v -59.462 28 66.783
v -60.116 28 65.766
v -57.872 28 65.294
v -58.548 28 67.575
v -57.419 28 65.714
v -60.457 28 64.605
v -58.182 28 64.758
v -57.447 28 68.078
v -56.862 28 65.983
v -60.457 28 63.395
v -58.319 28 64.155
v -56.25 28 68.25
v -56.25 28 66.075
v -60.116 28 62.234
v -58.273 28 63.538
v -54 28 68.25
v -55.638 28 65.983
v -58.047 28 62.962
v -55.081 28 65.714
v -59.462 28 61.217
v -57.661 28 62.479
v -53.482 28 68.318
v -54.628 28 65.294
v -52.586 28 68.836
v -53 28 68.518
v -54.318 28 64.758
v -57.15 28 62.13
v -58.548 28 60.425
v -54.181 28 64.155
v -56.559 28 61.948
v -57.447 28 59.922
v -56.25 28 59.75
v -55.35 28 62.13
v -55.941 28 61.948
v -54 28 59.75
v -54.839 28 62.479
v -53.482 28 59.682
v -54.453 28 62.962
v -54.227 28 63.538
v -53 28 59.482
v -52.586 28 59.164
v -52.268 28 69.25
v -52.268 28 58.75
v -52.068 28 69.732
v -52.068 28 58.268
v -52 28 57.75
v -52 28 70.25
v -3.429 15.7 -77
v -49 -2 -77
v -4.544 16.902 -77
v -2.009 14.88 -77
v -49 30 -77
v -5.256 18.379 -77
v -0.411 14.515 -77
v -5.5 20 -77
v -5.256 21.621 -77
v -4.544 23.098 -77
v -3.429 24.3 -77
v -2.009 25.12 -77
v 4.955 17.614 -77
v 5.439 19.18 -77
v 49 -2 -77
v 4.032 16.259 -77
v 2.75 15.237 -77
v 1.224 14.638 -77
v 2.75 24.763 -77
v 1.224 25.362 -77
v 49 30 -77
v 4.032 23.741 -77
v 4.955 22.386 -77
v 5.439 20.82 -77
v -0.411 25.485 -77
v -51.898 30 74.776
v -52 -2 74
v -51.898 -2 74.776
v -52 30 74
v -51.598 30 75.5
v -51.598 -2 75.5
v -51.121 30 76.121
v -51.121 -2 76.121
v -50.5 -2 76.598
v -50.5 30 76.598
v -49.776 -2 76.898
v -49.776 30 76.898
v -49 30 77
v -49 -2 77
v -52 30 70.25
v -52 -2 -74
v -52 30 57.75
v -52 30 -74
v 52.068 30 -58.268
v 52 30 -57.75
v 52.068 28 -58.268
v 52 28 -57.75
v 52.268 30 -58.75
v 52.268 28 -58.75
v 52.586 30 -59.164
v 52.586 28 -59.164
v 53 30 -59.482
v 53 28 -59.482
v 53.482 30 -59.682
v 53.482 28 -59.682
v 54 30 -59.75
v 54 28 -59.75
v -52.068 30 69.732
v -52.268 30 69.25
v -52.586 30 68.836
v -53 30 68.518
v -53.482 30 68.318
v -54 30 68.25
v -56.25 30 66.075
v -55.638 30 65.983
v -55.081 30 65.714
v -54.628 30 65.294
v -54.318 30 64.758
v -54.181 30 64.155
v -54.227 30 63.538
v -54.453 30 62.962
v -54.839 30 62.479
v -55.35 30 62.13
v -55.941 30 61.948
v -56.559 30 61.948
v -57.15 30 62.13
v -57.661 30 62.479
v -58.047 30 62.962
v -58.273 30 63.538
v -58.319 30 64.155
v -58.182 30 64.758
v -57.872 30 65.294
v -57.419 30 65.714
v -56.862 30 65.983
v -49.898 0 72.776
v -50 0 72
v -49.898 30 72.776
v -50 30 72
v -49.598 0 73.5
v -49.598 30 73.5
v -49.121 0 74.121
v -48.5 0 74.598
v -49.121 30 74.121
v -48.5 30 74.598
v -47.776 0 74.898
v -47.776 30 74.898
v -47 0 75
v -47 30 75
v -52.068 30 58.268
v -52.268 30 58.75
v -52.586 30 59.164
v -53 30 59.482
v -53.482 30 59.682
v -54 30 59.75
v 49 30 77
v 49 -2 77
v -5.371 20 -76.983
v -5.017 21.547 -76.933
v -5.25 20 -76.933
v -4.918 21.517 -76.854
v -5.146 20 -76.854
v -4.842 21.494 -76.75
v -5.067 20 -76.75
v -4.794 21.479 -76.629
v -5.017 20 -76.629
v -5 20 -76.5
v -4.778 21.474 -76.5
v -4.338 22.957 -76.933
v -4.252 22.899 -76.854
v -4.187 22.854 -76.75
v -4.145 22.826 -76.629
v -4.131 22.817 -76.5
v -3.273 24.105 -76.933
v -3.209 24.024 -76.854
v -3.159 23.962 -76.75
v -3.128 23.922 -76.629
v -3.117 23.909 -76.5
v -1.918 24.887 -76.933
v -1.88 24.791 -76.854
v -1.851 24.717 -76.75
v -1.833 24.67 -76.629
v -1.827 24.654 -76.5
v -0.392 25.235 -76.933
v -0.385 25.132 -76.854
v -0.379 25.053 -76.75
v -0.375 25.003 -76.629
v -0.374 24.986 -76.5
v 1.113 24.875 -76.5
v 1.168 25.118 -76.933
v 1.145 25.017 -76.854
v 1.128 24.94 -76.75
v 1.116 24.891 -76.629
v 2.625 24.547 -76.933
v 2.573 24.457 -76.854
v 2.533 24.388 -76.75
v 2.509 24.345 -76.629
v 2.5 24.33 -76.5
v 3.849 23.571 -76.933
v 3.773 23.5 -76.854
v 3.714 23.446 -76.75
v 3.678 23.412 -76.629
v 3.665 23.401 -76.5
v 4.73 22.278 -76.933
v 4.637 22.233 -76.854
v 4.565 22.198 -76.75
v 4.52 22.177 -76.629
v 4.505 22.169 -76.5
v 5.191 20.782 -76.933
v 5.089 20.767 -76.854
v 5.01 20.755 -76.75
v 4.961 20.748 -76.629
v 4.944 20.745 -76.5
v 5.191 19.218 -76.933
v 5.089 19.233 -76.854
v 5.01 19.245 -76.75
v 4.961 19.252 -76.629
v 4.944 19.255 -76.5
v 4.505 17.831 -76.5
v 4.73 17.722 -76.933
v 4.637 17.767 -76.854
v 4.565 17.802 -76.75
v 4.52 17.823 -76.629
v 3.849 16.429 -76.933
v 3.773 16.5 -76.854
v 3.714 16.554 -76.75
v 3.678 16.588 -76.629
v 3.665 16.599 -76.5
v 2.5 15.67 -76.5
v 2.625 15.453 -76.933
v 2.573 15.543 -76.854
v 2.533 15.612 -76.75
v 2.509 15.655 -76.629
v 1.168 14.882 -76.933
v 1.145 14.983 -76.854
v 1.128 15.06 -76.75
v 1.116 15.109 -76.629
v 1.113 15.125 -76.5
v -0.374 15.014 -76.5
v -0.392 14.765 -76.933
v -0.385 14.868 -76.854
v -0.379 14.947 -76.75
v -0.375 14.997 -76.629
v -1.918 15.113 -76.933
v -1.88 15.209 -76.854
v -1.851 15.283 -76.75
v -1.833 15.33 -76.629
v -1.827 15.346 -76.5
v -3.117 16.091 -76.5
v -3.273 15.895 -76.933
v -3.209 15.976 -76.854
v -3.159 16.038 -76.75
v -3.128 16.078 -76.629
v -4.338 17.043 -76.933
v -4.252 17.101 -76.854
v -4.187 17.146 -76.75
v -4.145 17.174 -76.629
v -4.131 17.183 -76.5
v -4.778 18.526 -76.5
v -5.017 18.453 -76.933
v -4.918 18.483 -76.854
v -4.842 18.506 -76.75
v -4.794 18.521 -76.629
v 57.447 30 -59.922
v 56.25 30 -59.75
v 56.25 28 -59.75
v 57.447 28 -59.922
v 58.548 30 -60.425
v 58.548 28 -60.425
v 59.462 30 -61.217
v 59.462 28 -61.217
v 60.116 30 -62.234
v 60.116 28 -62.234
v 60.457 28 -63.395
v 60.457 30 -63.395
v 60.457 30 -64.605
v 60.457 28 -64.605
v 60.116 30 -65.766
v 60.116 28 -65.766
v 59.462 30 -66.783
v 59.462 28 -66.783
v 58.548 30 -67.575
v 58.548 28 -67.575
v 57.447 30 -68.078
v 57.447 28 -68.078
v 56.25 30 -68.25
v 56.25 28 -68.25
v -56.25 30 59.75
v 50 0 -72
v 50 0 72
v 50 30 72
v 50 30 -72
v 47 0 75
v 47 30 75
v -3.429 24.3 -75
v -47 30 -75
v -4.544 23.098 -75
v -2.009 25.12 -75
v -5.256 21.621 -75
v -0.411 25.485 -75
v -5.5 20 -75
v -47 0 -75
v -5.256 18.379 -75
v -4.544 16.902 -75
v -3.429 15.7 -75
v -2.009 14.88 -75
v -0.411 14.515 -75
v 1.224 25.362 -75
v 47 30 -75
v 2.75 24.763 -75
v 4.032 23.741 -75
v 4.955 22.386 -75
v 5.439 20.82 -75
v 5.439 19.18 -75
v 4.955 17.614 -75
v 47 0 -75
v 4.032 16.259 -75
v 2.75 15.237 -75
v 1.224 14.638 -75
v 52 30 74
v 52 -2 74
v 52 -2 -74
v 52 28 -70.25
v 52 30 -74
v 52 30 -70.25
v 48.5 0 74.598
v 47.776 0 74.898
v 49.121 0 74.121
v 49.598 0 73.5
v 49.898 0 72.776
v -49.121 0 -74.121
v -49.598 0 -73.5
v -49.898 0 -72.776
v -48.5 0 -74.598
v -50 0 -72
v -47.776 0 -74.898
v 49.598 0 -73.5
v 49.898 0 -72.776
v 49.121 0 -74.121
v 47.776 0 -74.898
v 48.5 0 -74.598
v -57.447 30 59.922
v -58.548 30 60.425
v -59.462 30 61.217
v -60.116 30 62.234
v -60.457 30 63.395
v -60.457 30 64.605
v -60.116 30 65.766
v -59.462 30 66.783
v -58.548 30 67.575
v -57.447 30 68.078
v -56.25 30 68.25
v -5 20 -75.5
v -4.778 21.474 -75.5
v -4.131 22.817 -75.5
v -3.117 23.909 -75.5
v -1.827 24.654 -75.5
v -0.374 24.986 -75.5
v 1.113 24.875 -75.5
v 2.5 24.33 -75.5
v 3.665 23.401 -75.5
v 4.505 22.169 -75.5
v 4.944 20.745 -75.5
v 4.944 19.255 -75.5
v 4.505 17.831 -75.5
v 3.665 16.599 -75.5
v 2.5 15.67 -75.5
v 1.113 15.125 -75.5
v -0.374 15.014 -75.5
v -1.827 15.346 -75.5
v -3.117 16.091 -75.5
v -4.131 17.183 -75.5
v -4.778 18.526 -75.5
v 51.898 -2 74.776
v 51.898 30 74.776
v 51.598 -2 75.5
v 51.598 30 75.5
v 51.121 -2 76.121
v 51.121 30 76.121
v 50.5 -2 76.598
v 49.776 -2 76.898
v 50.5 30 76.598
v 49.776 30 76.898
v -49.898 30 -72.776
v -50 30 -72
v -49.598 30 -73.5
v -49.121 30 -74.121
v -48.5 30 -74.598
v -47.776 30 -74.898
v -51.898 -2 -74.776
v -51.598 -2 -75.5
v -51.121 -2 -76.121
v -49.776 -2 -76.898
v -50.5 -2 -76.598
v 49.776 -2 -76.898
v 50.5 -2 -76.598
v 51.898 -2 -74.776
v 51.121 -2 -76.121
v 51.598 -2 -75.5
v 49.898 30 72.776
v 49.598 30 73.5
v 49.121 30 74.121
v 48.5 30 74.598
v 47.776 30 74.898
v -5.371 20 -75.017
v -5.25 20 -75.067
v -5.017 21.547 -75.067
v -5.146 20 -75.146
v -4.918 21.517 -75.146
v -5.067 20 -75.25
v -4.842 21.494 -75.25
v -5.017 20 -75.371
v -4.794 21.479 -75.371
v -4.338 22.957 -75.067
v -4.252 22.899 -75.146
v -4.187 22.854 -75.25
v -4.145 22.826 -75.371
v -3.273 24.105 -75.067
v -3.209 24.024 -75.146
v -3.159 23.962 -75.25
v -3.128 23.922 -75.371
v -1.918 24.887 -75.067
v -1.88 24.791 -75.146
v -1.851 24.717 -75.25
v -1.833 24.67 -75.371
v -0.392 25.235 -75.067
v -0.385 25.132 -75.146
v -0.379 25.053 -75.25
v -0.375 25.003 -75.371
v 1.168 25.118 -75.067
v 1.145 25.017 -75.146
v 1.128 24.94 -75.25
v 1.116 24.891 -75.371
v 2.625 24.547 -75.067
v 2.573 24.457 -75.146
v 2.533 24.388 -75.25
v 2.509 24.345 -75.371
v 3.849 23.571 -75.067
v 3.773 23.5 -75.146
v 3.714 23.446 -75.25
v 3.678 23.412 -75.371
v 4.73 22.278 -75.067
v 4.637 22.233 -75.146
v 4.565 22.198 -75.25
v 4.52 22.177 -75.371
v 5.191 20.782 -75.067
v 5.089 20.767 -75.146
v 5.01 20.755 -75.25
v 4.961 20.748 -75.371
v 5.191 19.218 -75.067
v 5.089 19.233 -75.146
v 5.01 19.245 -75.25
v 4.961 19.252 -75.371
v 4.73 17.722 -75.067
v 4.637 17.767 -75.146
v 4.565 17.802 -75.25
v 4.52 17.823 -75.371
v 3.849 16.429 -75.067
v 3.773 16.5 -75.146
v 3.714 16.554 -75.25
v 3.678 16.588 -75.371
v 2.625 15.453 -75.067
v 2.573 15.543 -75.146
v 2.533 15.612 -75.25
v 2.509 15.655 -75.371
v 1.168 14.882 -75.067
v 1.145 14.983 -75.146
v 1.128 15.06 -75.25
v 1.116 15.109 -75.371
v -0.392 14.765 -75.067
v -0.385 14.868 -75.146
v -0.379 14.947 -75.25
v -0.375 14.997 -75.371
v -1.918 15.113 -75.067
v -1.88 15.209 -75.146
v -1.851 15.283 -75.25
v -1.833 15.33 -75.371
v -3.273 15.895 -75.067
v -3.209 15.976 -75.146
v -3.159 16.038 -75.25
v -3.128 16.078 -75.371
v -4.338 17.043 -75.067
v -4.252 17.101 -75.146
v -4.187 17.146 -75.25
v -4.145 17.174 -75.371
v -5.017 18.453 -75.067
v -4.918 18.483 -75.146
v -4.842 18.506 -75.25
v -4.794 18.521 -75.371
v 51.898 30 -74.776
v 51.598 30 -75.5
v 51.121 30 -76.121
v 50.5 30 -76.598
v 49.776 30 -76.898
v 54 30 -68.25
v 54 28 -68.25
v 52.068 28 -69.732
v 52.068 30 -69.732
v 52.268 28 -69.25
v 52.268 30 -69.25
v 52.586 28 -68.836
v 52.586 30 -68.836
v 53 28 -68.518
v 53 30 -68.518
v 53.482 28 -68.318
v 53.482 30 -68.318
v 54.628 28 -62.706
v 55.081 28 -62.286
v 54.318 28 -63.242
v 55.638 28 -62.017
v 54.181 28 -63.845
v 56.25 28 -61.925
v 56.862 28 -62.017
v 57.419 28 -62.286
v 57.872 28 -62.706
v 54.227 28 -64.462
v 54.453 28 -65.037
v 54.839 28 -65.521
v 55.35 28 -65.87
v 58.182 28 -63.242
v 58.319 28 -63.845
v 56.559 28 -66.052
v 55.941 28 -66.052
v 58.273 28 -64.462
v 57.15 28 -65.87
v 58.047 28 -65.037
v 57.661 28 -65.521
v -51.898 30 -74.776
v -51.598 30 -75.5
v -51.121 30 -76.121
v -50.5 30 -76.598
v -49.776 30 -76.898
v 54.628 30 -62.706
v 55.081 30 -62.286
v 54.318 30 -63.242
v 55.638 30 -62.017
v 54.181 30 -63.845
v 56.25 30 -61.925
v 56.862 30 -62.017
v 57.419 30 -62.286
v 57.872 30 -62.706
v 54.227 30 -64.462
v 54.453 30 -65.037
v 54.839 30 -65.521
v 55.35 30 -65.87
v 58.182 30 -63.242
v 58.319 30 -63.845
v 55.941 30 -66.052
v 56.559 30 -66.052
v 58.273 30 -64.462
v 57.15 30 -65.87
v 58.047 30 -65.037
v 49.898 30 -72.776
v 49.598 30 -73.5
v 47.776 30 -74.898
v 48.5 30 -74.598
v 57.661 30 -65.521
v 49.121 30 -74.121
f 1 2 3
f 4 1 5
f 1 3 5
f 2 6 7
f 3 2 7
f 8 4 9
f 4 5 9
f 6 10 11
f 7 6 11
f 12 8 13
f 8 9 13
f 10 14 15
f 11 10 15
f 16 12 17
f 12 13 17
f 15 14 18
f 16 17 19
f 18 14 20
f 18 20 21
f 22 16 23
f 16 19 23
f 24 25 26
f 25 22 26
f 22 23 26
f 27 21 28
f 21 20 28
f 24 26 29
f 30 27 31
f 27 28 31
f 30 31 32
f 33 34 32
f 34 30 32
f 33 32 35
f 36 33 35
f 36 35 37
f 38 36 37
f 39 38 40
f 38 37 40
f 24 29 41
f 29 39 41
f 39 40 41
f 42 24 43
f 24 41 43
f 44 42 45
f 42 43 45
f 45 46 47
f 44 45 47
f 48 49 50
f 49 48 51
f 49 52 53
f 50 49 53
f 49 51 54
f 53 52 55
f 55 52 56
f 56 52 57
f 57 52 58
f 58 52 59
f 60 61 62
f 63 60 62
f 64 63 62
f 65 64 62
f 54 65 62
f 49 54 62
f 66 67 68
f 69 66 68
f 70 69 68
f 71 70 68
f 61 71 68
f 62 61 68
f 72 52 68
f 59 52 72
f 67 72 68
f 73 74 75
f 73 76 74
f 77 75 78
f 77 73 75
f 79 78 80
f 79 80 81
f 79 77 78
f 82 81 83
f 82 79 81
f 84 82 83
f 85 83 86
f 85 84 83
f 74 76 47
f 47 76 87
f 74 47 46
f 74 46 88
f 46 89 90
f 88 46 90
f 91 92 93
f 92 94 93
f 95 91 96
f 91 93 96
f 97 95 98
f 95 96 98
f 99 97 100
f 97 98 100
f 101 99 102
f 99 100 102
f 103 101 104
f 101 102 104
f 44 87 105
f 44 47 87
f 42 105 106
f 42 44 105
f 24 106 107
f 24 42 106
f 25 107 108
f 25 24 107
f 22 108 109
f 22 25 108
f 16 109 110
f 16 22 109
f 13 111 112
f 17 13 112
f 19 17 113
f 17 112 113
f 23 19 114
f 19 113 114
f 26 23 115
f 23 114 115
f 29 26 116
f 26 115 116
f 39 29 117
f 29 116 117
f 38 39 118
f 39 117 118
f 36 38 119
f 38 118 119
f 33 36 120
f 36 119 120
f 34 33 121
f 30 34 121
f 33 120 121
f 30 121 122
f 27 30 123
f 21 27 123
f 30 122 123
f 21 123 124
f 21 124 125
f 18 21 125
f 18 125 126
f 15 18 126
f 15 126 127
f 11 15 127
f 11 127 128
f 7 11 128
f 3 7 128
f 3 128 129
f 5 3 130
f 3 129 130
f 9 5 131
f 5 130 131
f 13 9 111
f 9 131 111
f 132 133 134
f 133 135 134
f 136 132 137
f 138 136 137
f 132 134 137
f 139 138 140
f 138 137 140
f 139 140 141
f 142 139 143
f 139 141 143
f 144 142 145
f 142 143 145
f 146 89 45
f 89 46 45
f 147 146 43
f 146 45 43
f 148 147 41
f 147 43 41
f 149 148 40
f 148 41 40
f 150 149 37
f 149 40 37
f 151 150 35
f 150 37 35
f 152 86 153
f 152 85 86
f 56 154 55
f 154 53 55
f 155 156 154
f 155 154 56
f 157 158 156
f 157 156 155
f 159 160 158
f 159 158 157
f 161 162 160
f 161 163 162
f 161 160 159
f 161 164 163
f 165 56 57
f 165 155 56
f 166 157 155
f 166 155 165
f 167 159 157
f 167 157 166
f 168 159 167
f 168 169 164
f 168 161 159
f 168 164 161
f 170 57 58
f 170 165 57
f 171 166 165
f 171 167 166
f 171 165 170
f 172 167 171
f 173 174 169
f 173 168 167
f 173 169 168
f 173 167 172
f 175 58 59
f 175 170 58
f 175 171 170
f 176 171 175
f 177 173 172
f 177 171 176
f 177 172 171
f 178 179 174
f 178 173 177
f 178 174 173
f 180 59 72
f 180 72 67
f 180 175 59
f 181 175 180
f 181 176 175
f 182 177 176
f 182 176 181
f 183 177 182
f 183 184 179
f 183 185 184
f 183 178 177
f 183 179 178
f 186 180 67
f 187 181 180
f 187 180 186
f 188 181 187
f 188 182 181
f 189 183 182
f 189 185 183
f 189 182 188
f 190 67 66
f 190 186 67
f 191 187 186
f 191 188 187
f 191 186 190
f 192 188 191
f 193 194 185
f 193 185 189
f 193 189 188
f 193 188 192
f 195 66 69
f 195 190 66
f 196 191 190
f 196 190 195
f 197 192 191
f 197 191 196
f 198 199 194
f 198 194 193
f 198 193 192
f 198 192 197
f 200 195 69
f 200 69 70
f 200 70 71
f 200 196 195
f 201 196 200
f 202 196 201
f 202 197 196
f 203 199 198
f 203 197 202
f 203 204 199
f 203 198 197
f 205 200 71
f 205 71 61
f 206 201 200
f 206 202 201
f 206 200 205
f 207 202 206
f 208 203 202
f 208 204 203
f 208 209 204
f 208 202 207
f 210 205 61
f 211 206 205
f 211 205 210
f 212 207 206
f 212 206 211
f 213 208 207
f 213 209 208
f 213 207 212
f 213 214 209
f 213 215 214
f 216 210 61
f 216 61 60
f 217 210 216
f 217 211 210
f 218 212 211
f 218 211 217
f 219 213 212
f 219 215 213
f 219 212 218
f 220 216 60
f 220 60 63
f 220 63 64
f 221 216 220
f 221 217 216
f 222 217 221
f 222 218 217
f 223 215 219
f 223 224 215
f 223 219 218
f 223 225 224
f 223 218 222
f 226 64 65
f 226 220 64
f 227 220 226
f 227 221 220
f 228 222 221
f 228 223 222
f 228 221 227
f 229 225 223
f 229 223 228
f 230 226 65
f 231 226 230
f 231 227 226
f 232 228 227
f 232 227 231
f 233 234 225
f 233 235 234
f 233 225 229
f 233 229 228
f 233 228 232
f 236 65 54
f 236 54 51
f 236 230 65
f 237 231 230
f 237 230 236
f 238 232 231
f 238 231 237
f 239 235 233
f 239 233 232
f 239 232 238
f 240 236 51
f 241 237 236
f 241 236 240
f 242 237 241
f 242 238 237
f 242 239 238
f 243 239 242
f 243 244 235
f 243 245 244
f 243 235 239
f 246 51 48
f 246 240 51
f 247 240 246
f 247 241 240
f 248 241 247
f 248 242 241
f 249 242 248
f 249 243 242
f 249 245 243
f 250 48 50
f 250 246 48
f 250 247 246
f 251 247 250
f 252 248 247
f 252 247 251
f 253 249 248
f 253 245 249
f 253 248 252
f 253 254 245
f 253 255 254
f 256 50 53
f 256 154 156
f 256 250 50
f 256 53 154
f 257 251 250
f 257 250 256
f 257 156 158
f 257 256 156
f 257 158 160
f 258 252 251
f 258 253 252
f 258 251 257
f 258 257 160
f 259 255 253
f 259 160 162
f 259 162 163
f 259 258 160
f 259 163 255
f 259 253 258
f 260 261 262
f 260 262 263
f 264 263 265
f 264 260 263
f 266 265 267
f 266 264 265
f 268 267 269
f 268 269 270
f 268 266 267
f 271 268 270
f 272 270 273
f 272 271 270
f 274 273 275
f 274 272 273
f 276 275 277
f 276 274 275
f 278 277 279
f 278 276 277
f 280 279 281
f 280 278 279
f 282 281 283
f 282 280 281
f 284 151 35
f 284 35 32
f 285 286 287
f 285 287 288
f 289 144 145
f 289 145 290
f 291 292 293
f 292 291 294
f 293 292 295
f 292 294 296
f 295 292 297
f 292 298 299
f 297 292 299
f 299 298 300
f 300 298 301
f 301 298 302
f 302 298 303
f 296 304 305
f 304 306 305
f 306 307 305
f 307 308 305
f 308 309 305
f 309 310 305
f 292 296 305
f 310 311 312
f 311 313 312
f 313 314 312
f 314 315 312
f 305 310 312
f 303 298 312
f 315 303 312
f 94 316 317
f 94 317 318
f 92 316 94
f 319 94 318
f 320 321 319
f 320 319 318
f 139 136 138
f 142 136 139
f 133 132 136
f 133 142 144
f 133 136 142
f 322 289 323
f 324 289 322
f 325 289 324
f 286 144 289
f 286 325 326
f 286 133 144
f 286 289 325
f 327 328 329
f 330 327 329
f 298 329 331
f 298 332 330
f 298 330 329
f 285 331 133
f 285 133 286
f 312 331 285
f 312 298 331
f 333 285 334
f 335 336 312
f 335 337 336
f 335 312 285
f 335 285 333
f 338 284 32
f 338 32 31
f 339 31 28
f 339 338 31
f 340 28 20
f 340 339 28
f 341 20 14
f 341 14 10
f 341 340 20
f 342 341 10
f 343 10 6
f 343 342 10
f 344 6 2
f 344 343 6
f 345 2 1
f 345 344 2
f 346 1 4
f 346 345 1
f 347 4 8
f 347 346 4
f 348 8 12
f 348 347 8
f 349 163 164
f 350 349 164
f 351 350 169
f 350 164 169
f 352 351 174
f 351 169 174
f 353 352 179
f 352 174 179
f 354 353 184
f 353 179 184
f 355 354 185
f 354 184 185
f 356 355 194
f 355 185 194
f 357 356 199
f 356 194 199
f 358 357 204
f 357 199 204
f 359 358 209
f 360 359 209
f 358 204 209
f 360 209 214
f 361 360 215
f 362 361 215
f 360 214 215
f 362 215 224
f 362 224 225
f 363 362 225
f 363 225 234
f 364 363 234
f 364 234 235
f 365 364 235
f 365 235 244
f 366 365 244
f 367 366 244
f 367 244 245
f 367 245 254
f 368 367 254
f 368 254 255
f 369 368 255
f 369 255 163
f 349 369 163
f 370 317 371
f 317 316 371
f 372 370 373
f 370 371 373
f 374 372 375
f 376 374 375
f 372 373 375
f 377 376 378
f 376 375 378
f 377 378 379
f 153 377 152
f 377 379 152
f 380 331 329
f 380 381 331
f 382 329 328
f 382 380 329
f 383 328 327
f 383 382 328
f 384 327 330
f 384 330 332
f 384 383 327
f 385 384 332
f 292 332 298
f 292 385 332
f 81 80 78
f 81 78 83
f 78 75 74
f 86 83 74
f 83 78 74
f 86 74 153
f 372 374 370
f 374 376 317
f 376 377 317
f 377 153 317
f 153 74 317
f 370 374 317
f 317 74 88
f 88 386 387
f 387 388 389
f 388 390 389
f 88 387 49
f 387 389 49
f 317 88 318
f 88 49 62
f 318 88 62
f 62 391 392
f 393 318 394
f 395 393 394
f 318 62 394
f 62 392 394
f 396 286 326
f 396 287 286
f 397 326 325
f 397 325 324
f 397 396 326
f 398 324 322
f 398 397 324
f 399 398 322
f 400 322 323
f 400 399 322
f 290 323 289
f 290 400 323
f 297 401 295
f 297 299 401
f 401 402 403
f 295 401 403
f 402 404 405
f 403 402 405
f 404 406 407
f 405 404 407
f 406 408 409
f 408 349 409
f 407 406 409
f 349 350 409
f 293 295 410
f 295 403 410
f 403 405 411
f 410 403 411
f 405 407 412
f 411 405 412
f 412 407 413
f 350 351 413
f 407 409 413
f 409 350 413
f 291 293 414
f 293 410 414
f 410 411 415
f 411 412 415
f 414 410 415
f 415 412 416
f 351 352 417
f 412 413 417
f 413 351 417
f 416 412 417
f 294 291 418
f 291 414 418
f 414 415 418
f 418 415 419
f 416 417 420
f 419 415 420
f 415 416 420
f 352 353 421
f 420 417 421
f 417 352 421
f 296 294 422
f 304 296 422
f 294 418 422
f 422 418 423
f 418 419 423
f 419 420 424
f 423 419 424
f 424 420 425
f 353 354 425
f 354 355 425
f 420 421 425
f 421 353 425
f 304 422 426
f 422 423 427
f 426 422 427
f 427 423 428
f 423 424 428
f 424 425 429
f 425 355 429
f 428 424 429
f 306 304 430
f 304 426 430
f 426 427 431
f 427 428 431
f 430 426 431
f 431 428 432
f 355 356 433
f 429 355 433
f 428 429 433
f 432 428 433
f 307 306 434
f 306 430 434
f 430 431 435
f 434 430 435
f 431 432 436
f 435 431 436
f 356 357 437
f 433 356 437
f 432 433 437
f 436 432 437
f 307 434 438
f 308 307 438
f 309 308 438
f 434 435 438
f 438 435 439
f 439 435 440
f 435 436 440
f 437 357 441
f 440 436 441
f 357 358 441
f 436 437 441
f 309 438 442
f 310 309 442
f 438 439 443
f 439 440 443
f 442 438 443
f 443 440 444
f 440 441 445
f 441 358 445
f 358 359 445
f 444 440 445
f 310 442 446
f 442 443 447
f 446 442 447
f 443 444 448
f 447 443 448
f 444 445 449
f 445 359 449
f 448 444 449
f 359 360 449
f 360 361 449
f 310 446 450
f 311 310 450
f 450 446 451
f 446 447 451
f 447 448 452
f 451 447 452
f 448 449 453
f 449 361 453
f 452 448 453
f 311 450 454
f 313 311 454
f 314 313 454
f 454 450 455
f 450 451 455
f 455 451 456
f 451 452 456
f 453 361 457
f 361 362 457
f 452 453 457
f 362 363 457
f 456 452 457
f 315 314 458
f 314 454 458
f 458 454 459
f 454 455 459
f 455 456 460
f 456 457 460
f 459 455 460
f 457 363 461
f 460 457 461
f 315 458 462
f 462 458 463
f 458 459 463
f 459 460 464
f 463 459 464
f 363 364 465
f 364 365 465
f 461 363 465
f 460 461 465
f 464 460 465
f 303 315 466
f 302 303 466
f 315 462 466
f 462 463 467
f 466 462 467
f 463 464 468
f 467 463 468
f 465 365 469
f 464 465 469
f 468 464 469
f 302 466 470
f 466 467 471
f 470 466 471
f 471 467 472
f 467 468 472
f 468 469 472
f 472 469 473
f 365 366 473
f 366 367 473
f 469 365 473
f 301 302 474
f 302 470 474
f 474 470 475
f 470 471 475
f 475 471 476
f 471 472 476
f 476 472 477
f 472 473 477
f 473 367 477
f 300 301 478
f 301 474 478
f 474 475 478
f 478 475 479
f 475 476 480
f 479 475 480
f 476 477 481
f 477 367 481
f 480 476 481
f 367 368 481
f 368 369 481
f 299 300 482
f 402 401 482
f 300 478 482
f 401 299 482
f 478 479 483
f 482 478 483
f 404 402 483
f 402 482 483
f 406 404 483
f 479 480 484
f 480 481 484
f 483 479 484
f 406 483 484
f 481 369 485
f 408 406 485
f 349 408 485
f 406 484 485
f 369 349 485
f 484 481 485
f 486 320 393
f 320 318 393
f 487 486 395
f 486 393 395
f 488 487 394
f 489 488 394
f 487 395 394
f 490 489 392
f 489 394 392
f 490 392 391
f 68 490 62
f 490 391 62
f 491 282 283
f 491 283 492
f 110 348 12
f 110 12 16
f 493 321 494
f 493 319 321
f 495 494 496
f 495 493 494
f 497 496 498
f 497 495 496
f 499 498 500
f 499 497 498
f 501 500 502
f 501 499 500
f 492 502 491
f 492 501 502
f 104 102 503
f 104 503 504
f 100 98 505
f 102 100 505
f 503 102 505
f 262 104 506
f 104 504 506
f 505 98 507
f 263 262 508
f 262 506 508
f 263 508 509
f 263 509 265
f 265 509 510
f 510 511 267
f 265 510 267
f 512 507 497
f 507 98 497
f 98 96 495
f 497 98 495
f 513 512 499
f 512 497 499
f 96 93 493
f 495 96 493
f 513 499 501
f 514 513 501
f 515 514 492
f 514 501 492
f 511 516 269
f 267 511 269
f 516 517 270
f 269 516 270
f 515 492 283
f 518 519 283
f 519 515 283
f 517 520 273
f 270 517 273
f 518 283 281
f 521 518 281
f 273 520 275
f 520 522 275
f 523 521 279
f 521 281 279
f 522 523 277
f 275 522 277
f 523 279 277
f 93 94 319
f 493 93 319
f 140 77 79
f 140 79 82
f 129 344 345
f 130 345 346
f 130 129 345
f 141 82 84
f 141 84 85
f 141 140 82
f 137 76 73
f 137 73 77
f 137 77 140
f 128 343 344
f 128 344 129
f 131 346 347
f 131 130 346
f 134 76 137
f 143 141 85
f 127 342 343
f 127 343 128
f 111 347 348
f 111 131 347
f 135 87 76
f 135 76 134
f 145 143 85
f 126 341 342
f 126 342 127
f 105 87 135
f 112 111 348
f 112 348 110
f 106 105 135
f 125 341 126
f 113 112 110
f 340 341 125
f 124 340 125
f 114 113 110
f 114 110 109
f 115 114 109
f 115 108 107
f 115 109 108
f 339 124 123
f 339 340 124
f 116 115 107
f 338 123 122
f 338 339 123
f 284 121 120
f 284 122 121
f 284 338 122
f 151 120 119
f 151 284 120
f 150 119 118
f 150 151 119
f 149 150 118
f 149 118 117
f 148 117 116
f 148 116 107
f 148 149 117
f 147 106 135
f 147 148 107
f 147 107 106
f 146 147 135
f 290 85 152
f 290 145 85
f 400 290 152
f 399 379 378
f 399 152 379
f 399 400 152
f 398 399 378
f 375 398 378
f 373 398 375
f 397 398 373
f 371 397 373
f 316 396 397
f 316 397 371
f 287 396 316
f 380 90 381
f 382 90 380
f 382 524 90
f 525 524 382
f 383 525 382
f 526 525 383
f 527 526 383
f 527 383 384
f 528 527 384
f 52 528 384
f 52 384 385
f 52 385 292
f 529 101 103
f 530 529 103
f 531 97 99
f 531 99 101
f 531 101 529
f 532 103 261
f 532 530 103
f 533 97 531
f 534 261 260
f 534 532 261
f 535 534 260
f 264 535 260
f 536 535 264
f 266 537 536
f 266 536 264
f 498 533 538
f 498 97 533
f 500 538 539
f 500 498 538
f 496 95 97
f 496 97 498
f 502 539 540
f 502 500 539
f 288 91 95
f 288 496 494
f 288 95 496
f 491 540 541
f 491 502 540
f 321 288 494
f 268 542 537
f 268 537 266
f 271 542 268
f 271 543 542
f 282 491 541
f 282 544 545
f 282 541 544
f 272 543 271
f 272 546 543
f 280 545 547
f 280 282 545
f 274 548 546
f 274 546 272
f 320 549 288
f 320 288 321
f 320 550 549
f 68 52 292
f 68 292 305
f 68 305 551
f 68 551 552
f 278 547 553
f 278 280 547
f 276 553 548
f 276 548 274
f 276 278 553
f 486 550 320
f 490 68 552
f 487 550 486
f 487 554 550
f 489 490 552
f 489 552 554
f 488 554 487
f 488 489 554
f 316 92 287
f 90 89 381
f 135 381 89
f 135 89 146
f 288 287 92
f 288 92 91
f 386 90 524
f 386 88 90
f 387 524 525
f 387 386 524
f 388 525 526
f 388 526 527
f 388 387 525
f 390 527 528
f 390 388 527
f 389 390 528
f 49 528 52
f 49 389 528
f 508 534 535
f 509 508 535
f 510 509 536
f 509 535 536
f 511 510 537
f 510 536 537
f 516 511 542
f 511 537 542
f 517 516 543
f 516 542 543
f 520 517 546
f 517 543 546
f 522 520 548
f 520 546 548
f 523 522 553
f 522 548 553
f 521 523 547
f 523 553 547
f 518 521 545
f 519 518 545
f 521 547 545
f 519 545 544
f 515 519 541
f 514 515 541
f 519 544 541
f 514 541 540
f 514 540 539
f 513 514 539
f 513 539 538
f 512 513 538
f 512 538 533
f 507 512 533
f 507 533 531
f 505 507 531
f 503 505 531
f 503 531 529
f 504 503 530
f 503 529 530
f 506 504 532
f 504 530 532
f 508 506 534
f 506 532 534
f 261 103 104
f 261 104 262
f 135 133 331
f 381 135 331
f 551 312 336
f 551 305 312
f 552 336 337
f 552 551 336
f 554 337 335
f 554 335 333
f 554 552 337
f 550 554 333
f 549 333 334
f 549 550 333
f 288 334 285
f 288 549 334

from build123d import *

# Parameters (mm, degrees)
SKETCH1_W           = 104
SKETCH1_H           = 154
SKETCH1_W_2         = 100
SKETCH1_H_2         = 150
BOSS_EXTRUDE1_DEPTH = 30
SKETCH1_2_W         = 104
SKETCH1_2_H         = 154
BOSS_EXTRUDE2_DEPTH = 2
FILLET1_R           = 3
SKETCH2_R           = 2.075
BOSS_EXTRUDE3_DEPTH = 2
SKETCH3_R           = 2.075
BOSS_EXTRUDE4_DEPTH = 2
SKETCH4_R           = 5
CUT_EXTRUDE1_DEPTH  = 10
FILLET2_R           = 0.5
FILLET3_R           = 2


with BuildPart() as part:
    # Sketch1 → Boss-Extrude1 (new body)
    with BuildSketch(Plane(origin=(0, 0, 0), x_dir=(1, 0, 0), z_dir=(0, 1, 0))):
        Rectangle(SKETCH1_W, SKETCH1_H)
        Rectangle(SKETCH1_W_2, SKETCH1_H_2, mode=Mode.SUBTRACT)
    extrude(amount=BOSS_EXTRUDE1_DEPTH)

    # Sketch1<2> → Boss-Extrude2 (add)
    with BuildSketch(Plane(origin=(0, 0, 0), x_dir=(1, 0, 0), z_dir=(0, 1, 0))):
        Rectangle(SKETCH1_2_W, SKETCH1_2_H)
    extrude(amount=-BOSS_EXTRUDE2_DEPTH)

    # Fillet1
    fillet1_edges = [part.edges().sort_by_distance(p)[0] for p in [
        (52, 14, -77),
        (52, 14, 77),
        (-52, 14, 77),
        (-52, 14, -77),
        (-50, 15, 75),
        (-50, 15, -75),
        (50, 15, -75),
        (50, 15, 75),
    ]]
    fillet(fillet1_edges, radius=FILLET1_R)

    # Sketch2 → Boss-Extrude3 (add)
    with BuildSketch(Plane(origin=(0, 30, 0), x_dir=(1, 0, 0), z_dir=(0, 1, 0))):
        with BuildLine():
            Line((56.25, 68.25), (52, 68.25))
            Line((52, 68.25), (52, 59.75))
            Line((52, 59.75), (56.25, 59.75))
            ThreePointArc((56.25, 59.75), (60.5, 64), (56.25, 68.25))
        make_face()
        with Locations((56.25, 64)):
            Circle(SKETCH2_R, mode=Mode.SUBTRACT)
    extrude(amount=-BOSS_EXTRUDE3_DEPTH)

    # Sketch3 → Boss-Extrude4 (add)
    with BuildSketch(Plane(origin=(0, 30, 0), x_dir=(1, 0, 0), z_dir=(0, 1, 0))):
        with BuildLine():
            Line((-52, -59.75), (-56.25, -59.75))
            ThreePointArc((-56.25, -59.75), (-60.5, -64), (-56.25, -68.25))
            Line((-56.25, -68.25), (-52, -68.25))
            Line((-52, -68.25), (-52, -59.75))
        make_face()
        with Locations((-56.25, -64)):
            Circle(SKETCH3_R, mode=Mode.SUBTRACT)
    extrude(amount=-BOSS_EXTRUDE4_DEPTH)

    # Sketch4 → Cut-Extrude1 (cut)
    with BuildSketch(Plane(origin=(0, 0, -77), x_dir=(-1, 0, 0), z_dir=(0, 0, -1))):
        with Locations((0, 20)):
            Circle(SKETCH4_R)
    extrude(amount=-CUT_EXTRUDE1_DEPTH, mode=Mode.SUBTRACT)

    # Fillet2
    fillet2_edges = [part.edges().sort_by_distance(p)[0] for p in [
        (5, 20, -75),
        (5, 20, -77),
    ]]
    fillet(fillet2_edges, radius=FILLET2_R)

    # Fillet3
    fillet3_edges = [part.edges().sort_by_distance(p)[0] for p in [
        (-52, 29, 68.25),
        (-52, 29, 59.75),
        (52, 29, -68.25),
        (52, 29, -59.75),
    ]]
    fillet(fillet3_edges, radius=FILLET3_R)


solid = part.part
